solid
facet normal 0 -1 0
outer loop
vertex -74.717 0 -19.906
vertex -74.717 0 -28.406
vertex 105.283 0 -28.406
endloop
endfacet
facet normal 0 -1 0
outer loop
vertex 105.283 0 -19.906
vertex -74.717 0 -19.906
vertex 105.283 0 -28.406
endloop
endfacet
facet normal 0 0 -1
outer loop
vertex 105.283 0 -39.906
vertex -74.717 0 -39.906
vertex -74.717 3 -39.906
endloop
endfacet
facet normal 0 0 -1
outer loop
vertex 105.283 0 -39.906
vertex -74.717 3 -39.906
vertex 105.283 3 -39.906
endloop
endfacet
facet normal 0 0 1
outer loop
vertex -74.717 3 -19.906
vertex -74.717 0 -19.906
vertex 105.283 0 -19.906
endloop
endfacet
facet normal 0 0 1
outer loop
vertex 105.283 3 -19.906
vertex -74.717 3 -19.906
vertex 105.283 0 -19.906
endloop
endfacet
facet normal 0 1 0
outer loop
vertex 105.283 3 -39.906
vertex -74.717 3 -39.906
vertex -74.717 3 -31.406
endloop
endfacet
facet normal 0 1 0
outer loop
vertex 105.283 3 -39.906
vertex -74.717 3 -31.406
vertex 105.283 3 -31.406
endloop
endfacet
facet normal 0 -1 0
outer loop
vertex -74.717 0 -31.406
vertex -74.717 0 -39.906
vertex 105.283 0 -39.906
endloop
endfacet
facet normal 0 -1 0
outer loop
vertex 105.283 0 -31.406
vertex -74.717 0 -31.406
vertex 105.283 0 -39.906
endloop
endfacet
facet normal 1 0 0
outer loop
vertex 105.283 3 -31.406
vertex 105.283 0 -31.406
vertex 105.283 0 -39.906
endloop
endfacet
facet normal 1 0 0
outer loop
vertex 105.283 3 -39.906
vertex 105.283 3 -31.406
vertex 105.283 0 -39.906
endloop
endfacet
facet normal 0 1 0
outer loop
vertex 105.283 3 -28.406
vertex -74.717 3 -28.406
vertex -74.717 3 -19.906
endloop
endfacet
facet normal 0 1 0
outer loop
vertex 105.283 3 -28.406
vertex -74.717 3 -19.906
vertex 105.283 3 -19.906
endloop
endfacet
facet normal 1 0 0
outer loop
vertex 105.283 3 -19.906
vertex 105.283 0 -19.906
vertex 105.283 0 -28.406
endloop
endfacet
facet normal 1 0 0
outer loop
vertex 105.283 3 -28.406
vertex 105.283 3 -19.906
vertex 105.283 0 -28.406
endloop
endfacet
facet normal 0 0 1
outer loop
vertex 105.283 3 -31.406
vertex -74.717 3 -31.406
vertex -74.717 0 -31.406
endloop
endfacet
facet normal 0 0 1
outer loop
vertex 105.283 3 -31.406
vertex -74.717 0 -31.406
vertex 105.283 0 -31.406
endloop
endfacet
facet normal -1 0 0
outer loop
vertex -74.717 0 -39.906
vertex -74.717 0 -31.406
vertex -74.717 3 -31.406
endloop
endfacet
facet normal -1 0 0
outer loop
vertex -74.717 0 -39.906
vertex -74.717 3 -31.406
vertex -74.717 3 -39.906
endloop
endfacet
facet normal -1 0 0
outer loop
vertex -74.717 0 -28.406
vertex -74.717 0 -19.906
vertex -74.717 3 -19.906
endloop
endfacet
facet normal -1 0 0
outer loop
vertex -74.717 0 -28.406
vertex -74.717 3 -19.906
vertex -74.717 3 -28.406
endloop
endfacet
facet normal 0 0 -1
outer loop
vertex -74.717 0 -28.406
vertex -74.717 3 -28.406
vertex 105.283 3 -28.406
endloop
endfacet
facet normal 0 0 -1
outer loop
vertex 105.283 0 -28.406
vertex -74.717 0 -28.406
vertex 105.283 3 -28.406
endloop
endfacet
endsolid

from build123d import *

# Parameters (mm, degrees)
SKETCH1_W               = 180
SKETCH1_H               = 20
BOSS_EXTRUDE1_DEPTH     = 3
SKETCH2_W               = 180
SKETCH2_H               = 3
CUT_EXTRUDE1_DEPTH      = 10
CUT_EXTRUDE1_DEPTH_BACK = 4


with BuildPart() as part:
    # Sketch1 → Boss-Extrude1 (new body)
    with BuildSketch(Plane(origin=(0, 0, 0), x_dir=(1, 0, 0), z_dir=(0, 1, 0))):
        with Locations((15.283018868, 29.905660377)):
            Rectangle(SKETCH1_W, SKETCH1_H)
    extrude(amount=BOSS_EXTRUDE1_DEPTH)

    # Sketch2 → Cut-Extrude1 (cut, two sides)
    with BuildSketch(Plane(origin=(0, 3, 0), x_dir=(1, 0, 0), z_dir=(0, 1, 0))) as cut_extrude1_sk:
        with Locations((15.283018868, 29.905660377)):
            Rectangle(SKETCH2_W, SKETCH2_H)
    extrude(amount=CUT_EXTRUDE1_DEPTH, mode=Mode.SUBTRACT)
    extrude(cut_extrude1_sk.sketch, amount=-CUT_EXTRUDE1_DEPTH_BACK, mode=Mode.SUBTRACT)


solid = part.part
